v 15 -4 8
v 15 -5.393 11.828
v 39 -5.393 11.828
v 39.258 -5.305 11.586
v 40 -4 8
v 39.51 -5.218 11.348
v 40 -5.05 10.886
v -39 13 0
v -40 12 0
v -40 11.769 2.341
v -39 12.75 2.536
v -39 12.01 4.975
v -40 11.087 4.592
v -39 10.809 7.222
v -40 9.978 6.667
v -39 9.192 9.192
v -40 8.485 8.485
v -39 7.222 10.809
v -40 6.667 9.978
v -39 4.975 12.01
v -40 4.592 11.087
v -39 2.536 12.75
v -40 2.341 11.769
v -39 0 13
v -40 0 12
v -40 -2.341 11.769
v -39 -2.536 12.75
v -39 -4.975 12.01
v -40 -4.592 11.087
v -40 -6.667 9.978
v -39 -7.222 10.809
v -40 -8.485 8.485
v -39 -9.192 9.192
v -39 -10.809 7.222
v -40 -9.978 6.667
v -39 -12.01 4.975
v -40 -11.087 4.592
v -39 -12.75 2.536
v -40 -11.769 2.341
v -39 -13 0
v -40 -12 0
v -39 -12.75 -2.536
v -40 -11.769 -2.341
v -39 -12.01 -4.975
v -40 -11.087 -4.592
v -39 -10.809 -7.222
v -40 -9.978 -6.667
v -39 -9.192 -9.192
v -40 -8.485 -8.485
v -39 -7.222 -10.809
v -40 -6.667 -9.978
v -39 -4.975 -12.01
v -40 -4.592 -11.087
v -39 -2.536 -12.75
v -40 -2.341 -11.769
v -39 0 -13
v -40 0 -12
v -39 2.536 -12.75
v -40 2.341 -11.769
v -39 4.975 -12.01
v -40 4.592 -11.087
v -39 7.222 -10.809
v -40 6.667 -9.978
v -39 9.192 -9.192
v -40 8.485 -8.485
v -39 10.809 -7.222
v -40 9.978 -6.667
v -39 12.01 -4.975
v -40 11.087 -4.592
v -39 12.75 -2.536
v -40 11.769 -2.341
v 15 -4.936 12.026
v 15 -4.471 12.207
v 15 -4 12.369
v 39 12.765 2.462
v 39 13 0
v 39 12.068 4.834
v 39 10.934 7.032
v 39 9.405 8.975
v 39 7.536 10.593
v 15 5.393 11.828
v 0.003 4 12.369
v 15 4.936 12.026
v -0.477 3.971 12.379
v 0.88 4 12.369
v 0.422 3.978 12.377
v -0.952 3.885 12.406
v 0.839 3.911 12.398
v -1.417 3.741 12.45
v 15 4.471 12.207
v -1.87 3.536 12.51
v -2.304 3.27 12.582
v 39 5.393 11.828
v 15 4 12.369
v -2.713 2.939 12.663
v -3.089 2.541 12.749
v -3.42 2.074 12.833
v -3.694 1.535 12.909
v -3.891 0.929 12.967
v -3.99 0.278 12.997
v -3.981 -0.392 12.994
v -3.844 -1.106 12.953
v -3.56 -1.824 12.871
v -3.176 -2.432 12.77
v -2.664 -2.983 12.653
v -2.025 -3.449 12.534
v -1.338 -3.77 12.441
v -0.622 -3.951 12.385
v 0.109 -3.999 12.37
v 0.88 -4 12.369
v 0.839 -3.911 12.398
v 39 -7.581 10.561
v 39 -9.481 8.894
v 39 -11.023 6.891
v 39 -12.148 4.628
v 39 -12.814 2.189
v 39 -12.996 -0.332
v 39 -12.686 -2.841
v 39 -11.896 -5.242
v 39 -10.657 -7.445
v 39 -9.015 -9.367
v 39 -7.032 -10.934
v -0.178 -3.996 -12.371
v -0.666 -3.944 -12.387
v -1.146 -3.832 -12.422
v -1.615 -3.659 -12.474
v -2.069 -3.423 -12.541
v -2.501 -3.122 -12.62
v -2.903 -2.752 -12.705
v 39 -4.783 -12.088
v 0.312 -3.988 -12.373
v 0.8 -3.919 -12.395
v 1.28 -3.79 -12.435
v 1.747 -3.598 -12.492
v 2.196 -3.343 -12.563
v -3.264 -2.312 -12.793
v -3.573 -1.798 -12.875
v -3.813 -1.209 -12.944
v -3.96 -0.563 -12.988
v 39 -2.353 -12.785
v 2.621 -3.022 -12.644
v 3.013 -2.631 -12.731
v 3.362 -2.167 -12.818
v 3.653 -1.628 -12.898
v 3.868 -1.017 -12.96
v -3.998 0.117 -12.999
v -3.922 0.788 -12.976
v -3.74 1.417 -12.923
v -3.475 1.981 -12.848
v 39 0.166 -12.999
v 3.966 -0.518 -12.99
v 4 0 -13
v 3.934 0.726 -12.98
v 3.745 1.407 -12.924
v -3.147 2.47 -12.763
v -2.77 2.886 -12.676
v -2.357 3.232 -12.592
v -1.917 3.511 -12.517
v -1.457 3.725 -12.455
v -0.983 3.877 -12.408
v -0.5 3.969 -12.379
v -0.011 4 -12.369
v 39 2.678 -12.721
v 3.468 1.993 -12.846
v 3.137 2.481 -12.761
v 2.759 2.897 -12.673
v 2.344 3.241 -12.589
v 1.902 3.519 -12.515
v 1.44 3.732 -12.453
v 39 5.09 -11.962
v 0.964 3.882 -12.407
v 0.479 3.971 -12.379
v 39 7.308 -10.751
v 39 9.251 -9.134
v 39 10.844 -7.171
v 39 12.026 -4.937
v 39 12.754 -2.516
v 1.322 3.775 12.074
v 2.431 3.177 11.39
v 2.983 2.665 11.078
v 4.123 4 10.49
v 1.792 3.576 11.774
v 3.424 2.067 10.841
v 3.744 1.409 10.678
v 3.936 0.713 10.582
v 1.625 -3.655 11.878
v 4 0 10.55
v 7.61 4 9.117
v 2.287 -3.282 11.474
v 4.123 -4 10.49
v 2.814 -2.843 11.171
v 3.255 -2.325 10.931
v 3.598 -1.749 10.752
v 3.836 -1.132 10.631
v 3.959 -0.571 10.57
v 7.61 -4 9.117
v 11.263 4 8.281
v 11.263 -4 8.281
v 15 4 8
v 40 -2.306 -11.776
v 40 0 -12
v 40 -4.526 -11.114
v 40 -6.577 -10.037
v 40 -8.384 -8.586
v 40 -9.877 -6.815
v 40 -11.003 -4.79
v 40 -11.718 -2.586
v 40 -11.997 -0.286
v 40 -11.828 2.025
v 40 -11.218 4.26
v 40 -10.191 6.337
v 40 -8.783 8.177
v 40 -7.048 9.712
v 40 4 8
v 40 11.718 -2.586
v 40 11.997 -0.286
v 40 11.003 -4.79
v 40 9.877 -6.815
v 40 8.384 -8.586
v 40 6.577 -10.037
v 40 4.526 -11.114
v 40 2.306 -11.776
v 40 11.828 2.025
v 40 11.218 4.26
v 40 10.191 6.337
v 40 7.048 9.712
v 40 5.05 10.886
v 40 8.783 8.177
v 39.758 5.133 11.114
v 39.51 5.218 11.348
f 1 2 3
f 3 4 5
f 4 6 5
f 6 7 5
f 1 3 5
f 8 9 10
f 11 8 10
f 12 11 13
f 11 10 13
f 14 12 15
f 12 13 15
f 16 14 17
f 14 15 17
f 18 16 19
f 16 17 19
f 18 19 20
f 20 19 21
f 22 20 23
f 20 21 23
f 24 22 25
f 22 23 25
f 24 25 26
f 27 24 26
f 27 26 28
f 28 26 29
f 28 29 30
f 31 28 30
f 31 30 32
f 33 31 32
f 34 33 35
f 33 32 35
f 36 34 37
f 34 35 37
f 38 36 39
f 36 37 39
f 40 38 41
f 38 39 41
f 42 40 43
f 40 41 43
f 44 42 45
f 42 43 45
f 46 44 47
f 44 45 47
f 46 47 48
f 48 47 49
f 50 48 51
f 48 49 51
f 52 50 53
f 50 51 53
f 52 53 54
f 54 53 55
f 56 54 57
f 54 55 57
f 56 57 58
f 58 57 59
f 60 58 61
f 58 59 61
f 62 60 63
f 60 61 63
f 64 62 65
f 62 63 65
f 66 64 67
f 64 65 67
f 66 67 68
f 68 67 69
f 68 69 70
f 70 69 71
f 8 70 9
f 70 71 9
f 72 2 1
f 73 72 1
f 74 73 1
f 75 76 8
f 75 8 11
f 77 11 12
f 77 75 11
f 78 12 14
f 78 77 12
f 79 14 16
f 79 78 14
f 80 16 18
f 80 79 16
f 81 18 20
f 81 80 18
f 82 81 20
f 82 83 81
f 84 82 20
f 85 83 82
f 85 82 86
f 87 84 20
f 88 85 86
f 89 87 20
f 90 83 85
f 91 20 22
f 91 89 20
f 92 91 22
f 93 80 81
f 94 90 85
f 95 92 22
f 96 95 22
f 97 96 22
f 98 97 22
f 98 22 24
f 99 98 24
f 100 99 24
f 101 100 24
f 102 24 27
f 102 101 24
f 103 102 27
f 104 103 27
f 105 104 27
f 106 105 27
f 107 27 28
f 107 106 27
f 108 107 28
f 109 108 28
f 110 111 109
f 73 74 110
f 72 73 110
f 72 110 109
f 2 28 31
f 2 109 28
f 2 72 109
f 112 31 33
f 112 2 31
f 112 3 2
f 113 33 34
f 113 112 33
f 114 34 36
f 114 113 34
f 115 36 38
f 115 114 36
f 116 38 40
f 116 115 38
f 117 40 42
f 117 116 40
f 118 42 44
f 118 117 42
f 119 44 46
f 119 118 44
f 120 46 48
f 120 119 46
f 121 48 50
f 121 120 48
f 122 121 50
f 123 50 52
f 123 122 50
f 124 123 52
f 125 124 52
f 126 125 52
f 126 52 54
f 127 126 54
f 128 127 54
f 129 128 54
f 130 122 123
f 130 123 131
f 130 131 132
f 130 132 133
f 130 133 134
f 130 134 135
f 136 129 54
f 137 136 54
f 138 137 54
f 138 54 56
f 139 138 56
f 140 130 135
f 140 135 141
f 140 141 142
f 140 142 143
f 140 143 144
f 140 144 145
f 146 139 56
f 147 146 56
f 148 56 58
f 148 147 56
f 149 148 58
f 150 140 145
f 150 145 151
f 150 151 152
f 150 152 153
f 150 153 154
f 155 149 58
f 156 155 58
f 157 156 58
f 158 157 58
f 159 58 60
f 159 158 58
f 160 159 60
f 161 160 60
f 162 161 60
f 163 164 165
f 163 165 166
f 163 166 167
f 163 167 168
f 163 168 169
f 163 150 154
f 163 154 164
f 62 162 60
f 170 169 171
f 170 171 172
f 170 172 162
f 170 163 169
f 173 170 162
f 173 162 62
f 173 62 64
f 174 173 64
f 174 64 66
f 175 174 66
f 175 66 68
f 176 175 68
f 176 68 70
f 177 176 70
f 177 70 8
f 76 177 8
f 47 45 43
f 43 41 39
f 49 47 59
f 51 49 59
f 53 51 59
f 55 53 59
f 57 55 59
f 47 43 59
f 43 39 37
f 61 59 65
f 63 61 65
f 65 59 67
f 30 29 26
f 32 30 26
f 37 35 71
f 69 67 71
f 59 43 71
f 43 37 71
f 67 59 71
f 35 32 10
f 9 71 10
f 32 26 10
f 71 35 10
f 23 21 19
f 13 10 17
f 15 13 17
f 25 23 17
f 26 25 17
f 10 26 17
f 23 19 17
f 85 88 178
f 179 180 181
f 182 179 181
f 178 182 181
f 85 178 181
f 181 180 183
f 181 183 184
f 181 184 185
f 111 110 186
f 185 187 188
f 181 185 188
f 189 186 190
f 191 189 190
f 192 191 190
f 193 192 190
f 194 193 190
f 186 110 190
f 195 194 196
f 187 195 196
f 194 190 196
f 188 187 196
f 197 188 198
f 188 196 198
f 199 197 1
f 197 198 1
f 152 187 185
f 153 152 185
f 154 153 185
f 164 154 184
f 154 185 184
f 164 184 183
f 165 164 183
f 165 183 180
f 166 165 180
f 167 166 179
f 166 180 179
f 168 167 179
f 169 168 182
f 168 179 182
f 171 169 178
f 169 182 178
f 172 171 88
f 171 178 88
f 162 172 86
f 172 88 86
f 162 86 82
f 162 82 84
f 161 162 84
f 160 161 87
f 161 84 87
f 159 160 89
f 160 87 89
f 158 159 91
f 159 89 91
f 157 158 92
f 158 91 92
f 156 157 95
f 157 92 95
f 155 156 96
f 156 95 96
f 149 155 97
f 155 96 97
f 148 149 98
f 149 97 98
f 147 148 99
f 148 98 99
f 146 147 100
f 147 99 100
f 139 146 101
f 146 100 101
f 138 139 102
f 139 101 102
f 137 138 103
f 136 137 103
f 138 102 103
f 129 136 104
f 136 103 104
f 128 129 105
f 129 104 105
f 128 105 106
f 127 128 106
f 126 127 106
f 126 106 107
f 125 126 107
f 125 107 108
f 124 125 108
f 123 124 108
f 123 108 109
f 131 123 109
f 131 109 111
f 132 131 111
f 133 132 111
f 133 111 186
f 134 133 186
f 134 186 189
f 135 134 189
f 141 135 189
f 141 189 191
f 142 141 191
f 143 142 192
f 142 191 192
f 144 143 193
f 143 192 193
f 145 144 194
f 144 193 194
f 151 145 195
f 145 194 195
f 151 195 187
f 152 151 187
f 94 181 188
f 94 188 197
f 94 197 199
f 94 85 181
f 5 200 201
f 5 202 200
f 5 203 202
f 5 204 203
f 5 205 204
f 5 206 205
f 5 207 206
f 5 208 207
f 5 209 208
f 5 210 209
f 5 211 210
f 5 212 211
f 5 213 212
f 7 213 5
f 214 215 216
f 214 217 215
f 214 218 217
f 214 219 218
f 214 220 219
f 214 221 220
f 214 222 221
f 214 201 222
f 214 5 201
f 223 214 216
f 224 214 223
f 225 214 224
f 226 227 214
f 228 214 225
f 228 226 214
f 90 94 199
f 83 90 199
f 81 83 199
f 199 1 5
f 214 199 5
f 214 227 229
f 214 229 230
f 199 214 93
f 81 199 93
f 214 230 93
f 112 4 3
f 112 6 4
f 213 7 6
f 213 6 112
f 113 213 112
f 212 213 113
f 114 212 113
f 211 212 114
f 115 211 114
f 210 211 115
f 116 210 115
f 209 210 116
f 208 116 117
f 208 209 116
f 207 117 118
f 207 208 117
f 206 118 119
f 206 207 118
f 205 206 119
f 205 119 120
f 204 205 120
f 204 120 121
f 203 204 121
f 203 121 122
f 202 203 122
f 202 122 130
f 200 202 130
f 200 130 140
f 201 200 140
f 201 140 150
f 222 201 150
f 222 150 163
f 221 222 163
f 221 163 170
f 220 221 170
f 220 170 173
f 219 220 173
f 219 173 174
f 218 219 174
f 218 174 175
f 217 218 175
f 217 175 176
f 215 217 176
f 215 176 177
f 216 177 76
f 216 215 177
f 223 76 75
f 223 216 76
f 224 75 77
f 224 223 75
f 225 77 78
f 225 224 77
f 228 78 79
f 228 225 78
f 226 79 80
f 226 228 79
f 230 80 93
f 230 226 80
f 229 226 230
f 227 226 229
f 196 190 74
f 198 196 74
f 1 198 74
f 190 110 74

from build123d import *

# Parameters (mm, degrees)
F0_R     = 13
F1_DEPTH = 40
F2_R     = 4
F3_DEPTH = 13
F4_SIZE  = 1
F6_DEPTH = 4
F8_DEPTH = 25


with BuildPart() as f1:
    # F0 (on Right) → F1 (new body, symmetric)
    with BuildSketch(Plane.YZ):
        Circle(F0_R)
    extrude(amount=F1_DEPTH, both=True)

    # F2 (on Top) → F3 (cut, symmetric)
    with BuildSketch(Plane.XY):
        Circle(F2_R)
    extrude(amount=F3_DEPTH, both=True, mode=Mode.SUBTRACT)

    # F4
    f4_edges = [f1.edges().sort_by_distance(p)[0] for p in [
        (-40, -13, 0),
        (40, -13, 0),
    ]]
    chamfer(f4_edges, length=F4_SIZE)

    # F5 (on Front) → F6 (cut, symmetric)
    with BuildSketch(Plane.XZ):
        with BuildLine():
            Line((39, 13), (0, 13))
            ThreePointArc((0, 13), (7.0943058496, 9.2829175487), (15, 8))
            Line((15, 8), (40, 8))
            Line((40, 8), (40, 12))
            Line((40, 12), (39, 13))
        make_face()
    extrude(amount=F6_DEPTH, both=True, mode=Mode.SUBTRACT)

    # F7 (on face) → F8 (cut)
    with BuildSketch(Plane.YZ.offset(40)):
        with BuildLine():
            ThreePointArc((5.3934227849, 11.8283976372), (4.7044921415, 12.1189006799), (4, 12.3693168769))
            Line((4, 12.3693168769), (4, 8))
            Line((4, 8), (5.3934227849, 11.8283976372))
        make_face()
        with BuildLine():
            Line((-5.3934227849, 11.8283976372), (-4, 8))
            Line((-4, 8), (-4, 12.3693168769))
            ThreePointArc((-4, 12.3693168769), (-4.7044921415, 12.1189006799), (-5.3934227849, 11.8283976372))
        make_face()
    extrude(amount=-F8_DEPTH, mode=Mode.SUBTRACT)


solid = f1.part
